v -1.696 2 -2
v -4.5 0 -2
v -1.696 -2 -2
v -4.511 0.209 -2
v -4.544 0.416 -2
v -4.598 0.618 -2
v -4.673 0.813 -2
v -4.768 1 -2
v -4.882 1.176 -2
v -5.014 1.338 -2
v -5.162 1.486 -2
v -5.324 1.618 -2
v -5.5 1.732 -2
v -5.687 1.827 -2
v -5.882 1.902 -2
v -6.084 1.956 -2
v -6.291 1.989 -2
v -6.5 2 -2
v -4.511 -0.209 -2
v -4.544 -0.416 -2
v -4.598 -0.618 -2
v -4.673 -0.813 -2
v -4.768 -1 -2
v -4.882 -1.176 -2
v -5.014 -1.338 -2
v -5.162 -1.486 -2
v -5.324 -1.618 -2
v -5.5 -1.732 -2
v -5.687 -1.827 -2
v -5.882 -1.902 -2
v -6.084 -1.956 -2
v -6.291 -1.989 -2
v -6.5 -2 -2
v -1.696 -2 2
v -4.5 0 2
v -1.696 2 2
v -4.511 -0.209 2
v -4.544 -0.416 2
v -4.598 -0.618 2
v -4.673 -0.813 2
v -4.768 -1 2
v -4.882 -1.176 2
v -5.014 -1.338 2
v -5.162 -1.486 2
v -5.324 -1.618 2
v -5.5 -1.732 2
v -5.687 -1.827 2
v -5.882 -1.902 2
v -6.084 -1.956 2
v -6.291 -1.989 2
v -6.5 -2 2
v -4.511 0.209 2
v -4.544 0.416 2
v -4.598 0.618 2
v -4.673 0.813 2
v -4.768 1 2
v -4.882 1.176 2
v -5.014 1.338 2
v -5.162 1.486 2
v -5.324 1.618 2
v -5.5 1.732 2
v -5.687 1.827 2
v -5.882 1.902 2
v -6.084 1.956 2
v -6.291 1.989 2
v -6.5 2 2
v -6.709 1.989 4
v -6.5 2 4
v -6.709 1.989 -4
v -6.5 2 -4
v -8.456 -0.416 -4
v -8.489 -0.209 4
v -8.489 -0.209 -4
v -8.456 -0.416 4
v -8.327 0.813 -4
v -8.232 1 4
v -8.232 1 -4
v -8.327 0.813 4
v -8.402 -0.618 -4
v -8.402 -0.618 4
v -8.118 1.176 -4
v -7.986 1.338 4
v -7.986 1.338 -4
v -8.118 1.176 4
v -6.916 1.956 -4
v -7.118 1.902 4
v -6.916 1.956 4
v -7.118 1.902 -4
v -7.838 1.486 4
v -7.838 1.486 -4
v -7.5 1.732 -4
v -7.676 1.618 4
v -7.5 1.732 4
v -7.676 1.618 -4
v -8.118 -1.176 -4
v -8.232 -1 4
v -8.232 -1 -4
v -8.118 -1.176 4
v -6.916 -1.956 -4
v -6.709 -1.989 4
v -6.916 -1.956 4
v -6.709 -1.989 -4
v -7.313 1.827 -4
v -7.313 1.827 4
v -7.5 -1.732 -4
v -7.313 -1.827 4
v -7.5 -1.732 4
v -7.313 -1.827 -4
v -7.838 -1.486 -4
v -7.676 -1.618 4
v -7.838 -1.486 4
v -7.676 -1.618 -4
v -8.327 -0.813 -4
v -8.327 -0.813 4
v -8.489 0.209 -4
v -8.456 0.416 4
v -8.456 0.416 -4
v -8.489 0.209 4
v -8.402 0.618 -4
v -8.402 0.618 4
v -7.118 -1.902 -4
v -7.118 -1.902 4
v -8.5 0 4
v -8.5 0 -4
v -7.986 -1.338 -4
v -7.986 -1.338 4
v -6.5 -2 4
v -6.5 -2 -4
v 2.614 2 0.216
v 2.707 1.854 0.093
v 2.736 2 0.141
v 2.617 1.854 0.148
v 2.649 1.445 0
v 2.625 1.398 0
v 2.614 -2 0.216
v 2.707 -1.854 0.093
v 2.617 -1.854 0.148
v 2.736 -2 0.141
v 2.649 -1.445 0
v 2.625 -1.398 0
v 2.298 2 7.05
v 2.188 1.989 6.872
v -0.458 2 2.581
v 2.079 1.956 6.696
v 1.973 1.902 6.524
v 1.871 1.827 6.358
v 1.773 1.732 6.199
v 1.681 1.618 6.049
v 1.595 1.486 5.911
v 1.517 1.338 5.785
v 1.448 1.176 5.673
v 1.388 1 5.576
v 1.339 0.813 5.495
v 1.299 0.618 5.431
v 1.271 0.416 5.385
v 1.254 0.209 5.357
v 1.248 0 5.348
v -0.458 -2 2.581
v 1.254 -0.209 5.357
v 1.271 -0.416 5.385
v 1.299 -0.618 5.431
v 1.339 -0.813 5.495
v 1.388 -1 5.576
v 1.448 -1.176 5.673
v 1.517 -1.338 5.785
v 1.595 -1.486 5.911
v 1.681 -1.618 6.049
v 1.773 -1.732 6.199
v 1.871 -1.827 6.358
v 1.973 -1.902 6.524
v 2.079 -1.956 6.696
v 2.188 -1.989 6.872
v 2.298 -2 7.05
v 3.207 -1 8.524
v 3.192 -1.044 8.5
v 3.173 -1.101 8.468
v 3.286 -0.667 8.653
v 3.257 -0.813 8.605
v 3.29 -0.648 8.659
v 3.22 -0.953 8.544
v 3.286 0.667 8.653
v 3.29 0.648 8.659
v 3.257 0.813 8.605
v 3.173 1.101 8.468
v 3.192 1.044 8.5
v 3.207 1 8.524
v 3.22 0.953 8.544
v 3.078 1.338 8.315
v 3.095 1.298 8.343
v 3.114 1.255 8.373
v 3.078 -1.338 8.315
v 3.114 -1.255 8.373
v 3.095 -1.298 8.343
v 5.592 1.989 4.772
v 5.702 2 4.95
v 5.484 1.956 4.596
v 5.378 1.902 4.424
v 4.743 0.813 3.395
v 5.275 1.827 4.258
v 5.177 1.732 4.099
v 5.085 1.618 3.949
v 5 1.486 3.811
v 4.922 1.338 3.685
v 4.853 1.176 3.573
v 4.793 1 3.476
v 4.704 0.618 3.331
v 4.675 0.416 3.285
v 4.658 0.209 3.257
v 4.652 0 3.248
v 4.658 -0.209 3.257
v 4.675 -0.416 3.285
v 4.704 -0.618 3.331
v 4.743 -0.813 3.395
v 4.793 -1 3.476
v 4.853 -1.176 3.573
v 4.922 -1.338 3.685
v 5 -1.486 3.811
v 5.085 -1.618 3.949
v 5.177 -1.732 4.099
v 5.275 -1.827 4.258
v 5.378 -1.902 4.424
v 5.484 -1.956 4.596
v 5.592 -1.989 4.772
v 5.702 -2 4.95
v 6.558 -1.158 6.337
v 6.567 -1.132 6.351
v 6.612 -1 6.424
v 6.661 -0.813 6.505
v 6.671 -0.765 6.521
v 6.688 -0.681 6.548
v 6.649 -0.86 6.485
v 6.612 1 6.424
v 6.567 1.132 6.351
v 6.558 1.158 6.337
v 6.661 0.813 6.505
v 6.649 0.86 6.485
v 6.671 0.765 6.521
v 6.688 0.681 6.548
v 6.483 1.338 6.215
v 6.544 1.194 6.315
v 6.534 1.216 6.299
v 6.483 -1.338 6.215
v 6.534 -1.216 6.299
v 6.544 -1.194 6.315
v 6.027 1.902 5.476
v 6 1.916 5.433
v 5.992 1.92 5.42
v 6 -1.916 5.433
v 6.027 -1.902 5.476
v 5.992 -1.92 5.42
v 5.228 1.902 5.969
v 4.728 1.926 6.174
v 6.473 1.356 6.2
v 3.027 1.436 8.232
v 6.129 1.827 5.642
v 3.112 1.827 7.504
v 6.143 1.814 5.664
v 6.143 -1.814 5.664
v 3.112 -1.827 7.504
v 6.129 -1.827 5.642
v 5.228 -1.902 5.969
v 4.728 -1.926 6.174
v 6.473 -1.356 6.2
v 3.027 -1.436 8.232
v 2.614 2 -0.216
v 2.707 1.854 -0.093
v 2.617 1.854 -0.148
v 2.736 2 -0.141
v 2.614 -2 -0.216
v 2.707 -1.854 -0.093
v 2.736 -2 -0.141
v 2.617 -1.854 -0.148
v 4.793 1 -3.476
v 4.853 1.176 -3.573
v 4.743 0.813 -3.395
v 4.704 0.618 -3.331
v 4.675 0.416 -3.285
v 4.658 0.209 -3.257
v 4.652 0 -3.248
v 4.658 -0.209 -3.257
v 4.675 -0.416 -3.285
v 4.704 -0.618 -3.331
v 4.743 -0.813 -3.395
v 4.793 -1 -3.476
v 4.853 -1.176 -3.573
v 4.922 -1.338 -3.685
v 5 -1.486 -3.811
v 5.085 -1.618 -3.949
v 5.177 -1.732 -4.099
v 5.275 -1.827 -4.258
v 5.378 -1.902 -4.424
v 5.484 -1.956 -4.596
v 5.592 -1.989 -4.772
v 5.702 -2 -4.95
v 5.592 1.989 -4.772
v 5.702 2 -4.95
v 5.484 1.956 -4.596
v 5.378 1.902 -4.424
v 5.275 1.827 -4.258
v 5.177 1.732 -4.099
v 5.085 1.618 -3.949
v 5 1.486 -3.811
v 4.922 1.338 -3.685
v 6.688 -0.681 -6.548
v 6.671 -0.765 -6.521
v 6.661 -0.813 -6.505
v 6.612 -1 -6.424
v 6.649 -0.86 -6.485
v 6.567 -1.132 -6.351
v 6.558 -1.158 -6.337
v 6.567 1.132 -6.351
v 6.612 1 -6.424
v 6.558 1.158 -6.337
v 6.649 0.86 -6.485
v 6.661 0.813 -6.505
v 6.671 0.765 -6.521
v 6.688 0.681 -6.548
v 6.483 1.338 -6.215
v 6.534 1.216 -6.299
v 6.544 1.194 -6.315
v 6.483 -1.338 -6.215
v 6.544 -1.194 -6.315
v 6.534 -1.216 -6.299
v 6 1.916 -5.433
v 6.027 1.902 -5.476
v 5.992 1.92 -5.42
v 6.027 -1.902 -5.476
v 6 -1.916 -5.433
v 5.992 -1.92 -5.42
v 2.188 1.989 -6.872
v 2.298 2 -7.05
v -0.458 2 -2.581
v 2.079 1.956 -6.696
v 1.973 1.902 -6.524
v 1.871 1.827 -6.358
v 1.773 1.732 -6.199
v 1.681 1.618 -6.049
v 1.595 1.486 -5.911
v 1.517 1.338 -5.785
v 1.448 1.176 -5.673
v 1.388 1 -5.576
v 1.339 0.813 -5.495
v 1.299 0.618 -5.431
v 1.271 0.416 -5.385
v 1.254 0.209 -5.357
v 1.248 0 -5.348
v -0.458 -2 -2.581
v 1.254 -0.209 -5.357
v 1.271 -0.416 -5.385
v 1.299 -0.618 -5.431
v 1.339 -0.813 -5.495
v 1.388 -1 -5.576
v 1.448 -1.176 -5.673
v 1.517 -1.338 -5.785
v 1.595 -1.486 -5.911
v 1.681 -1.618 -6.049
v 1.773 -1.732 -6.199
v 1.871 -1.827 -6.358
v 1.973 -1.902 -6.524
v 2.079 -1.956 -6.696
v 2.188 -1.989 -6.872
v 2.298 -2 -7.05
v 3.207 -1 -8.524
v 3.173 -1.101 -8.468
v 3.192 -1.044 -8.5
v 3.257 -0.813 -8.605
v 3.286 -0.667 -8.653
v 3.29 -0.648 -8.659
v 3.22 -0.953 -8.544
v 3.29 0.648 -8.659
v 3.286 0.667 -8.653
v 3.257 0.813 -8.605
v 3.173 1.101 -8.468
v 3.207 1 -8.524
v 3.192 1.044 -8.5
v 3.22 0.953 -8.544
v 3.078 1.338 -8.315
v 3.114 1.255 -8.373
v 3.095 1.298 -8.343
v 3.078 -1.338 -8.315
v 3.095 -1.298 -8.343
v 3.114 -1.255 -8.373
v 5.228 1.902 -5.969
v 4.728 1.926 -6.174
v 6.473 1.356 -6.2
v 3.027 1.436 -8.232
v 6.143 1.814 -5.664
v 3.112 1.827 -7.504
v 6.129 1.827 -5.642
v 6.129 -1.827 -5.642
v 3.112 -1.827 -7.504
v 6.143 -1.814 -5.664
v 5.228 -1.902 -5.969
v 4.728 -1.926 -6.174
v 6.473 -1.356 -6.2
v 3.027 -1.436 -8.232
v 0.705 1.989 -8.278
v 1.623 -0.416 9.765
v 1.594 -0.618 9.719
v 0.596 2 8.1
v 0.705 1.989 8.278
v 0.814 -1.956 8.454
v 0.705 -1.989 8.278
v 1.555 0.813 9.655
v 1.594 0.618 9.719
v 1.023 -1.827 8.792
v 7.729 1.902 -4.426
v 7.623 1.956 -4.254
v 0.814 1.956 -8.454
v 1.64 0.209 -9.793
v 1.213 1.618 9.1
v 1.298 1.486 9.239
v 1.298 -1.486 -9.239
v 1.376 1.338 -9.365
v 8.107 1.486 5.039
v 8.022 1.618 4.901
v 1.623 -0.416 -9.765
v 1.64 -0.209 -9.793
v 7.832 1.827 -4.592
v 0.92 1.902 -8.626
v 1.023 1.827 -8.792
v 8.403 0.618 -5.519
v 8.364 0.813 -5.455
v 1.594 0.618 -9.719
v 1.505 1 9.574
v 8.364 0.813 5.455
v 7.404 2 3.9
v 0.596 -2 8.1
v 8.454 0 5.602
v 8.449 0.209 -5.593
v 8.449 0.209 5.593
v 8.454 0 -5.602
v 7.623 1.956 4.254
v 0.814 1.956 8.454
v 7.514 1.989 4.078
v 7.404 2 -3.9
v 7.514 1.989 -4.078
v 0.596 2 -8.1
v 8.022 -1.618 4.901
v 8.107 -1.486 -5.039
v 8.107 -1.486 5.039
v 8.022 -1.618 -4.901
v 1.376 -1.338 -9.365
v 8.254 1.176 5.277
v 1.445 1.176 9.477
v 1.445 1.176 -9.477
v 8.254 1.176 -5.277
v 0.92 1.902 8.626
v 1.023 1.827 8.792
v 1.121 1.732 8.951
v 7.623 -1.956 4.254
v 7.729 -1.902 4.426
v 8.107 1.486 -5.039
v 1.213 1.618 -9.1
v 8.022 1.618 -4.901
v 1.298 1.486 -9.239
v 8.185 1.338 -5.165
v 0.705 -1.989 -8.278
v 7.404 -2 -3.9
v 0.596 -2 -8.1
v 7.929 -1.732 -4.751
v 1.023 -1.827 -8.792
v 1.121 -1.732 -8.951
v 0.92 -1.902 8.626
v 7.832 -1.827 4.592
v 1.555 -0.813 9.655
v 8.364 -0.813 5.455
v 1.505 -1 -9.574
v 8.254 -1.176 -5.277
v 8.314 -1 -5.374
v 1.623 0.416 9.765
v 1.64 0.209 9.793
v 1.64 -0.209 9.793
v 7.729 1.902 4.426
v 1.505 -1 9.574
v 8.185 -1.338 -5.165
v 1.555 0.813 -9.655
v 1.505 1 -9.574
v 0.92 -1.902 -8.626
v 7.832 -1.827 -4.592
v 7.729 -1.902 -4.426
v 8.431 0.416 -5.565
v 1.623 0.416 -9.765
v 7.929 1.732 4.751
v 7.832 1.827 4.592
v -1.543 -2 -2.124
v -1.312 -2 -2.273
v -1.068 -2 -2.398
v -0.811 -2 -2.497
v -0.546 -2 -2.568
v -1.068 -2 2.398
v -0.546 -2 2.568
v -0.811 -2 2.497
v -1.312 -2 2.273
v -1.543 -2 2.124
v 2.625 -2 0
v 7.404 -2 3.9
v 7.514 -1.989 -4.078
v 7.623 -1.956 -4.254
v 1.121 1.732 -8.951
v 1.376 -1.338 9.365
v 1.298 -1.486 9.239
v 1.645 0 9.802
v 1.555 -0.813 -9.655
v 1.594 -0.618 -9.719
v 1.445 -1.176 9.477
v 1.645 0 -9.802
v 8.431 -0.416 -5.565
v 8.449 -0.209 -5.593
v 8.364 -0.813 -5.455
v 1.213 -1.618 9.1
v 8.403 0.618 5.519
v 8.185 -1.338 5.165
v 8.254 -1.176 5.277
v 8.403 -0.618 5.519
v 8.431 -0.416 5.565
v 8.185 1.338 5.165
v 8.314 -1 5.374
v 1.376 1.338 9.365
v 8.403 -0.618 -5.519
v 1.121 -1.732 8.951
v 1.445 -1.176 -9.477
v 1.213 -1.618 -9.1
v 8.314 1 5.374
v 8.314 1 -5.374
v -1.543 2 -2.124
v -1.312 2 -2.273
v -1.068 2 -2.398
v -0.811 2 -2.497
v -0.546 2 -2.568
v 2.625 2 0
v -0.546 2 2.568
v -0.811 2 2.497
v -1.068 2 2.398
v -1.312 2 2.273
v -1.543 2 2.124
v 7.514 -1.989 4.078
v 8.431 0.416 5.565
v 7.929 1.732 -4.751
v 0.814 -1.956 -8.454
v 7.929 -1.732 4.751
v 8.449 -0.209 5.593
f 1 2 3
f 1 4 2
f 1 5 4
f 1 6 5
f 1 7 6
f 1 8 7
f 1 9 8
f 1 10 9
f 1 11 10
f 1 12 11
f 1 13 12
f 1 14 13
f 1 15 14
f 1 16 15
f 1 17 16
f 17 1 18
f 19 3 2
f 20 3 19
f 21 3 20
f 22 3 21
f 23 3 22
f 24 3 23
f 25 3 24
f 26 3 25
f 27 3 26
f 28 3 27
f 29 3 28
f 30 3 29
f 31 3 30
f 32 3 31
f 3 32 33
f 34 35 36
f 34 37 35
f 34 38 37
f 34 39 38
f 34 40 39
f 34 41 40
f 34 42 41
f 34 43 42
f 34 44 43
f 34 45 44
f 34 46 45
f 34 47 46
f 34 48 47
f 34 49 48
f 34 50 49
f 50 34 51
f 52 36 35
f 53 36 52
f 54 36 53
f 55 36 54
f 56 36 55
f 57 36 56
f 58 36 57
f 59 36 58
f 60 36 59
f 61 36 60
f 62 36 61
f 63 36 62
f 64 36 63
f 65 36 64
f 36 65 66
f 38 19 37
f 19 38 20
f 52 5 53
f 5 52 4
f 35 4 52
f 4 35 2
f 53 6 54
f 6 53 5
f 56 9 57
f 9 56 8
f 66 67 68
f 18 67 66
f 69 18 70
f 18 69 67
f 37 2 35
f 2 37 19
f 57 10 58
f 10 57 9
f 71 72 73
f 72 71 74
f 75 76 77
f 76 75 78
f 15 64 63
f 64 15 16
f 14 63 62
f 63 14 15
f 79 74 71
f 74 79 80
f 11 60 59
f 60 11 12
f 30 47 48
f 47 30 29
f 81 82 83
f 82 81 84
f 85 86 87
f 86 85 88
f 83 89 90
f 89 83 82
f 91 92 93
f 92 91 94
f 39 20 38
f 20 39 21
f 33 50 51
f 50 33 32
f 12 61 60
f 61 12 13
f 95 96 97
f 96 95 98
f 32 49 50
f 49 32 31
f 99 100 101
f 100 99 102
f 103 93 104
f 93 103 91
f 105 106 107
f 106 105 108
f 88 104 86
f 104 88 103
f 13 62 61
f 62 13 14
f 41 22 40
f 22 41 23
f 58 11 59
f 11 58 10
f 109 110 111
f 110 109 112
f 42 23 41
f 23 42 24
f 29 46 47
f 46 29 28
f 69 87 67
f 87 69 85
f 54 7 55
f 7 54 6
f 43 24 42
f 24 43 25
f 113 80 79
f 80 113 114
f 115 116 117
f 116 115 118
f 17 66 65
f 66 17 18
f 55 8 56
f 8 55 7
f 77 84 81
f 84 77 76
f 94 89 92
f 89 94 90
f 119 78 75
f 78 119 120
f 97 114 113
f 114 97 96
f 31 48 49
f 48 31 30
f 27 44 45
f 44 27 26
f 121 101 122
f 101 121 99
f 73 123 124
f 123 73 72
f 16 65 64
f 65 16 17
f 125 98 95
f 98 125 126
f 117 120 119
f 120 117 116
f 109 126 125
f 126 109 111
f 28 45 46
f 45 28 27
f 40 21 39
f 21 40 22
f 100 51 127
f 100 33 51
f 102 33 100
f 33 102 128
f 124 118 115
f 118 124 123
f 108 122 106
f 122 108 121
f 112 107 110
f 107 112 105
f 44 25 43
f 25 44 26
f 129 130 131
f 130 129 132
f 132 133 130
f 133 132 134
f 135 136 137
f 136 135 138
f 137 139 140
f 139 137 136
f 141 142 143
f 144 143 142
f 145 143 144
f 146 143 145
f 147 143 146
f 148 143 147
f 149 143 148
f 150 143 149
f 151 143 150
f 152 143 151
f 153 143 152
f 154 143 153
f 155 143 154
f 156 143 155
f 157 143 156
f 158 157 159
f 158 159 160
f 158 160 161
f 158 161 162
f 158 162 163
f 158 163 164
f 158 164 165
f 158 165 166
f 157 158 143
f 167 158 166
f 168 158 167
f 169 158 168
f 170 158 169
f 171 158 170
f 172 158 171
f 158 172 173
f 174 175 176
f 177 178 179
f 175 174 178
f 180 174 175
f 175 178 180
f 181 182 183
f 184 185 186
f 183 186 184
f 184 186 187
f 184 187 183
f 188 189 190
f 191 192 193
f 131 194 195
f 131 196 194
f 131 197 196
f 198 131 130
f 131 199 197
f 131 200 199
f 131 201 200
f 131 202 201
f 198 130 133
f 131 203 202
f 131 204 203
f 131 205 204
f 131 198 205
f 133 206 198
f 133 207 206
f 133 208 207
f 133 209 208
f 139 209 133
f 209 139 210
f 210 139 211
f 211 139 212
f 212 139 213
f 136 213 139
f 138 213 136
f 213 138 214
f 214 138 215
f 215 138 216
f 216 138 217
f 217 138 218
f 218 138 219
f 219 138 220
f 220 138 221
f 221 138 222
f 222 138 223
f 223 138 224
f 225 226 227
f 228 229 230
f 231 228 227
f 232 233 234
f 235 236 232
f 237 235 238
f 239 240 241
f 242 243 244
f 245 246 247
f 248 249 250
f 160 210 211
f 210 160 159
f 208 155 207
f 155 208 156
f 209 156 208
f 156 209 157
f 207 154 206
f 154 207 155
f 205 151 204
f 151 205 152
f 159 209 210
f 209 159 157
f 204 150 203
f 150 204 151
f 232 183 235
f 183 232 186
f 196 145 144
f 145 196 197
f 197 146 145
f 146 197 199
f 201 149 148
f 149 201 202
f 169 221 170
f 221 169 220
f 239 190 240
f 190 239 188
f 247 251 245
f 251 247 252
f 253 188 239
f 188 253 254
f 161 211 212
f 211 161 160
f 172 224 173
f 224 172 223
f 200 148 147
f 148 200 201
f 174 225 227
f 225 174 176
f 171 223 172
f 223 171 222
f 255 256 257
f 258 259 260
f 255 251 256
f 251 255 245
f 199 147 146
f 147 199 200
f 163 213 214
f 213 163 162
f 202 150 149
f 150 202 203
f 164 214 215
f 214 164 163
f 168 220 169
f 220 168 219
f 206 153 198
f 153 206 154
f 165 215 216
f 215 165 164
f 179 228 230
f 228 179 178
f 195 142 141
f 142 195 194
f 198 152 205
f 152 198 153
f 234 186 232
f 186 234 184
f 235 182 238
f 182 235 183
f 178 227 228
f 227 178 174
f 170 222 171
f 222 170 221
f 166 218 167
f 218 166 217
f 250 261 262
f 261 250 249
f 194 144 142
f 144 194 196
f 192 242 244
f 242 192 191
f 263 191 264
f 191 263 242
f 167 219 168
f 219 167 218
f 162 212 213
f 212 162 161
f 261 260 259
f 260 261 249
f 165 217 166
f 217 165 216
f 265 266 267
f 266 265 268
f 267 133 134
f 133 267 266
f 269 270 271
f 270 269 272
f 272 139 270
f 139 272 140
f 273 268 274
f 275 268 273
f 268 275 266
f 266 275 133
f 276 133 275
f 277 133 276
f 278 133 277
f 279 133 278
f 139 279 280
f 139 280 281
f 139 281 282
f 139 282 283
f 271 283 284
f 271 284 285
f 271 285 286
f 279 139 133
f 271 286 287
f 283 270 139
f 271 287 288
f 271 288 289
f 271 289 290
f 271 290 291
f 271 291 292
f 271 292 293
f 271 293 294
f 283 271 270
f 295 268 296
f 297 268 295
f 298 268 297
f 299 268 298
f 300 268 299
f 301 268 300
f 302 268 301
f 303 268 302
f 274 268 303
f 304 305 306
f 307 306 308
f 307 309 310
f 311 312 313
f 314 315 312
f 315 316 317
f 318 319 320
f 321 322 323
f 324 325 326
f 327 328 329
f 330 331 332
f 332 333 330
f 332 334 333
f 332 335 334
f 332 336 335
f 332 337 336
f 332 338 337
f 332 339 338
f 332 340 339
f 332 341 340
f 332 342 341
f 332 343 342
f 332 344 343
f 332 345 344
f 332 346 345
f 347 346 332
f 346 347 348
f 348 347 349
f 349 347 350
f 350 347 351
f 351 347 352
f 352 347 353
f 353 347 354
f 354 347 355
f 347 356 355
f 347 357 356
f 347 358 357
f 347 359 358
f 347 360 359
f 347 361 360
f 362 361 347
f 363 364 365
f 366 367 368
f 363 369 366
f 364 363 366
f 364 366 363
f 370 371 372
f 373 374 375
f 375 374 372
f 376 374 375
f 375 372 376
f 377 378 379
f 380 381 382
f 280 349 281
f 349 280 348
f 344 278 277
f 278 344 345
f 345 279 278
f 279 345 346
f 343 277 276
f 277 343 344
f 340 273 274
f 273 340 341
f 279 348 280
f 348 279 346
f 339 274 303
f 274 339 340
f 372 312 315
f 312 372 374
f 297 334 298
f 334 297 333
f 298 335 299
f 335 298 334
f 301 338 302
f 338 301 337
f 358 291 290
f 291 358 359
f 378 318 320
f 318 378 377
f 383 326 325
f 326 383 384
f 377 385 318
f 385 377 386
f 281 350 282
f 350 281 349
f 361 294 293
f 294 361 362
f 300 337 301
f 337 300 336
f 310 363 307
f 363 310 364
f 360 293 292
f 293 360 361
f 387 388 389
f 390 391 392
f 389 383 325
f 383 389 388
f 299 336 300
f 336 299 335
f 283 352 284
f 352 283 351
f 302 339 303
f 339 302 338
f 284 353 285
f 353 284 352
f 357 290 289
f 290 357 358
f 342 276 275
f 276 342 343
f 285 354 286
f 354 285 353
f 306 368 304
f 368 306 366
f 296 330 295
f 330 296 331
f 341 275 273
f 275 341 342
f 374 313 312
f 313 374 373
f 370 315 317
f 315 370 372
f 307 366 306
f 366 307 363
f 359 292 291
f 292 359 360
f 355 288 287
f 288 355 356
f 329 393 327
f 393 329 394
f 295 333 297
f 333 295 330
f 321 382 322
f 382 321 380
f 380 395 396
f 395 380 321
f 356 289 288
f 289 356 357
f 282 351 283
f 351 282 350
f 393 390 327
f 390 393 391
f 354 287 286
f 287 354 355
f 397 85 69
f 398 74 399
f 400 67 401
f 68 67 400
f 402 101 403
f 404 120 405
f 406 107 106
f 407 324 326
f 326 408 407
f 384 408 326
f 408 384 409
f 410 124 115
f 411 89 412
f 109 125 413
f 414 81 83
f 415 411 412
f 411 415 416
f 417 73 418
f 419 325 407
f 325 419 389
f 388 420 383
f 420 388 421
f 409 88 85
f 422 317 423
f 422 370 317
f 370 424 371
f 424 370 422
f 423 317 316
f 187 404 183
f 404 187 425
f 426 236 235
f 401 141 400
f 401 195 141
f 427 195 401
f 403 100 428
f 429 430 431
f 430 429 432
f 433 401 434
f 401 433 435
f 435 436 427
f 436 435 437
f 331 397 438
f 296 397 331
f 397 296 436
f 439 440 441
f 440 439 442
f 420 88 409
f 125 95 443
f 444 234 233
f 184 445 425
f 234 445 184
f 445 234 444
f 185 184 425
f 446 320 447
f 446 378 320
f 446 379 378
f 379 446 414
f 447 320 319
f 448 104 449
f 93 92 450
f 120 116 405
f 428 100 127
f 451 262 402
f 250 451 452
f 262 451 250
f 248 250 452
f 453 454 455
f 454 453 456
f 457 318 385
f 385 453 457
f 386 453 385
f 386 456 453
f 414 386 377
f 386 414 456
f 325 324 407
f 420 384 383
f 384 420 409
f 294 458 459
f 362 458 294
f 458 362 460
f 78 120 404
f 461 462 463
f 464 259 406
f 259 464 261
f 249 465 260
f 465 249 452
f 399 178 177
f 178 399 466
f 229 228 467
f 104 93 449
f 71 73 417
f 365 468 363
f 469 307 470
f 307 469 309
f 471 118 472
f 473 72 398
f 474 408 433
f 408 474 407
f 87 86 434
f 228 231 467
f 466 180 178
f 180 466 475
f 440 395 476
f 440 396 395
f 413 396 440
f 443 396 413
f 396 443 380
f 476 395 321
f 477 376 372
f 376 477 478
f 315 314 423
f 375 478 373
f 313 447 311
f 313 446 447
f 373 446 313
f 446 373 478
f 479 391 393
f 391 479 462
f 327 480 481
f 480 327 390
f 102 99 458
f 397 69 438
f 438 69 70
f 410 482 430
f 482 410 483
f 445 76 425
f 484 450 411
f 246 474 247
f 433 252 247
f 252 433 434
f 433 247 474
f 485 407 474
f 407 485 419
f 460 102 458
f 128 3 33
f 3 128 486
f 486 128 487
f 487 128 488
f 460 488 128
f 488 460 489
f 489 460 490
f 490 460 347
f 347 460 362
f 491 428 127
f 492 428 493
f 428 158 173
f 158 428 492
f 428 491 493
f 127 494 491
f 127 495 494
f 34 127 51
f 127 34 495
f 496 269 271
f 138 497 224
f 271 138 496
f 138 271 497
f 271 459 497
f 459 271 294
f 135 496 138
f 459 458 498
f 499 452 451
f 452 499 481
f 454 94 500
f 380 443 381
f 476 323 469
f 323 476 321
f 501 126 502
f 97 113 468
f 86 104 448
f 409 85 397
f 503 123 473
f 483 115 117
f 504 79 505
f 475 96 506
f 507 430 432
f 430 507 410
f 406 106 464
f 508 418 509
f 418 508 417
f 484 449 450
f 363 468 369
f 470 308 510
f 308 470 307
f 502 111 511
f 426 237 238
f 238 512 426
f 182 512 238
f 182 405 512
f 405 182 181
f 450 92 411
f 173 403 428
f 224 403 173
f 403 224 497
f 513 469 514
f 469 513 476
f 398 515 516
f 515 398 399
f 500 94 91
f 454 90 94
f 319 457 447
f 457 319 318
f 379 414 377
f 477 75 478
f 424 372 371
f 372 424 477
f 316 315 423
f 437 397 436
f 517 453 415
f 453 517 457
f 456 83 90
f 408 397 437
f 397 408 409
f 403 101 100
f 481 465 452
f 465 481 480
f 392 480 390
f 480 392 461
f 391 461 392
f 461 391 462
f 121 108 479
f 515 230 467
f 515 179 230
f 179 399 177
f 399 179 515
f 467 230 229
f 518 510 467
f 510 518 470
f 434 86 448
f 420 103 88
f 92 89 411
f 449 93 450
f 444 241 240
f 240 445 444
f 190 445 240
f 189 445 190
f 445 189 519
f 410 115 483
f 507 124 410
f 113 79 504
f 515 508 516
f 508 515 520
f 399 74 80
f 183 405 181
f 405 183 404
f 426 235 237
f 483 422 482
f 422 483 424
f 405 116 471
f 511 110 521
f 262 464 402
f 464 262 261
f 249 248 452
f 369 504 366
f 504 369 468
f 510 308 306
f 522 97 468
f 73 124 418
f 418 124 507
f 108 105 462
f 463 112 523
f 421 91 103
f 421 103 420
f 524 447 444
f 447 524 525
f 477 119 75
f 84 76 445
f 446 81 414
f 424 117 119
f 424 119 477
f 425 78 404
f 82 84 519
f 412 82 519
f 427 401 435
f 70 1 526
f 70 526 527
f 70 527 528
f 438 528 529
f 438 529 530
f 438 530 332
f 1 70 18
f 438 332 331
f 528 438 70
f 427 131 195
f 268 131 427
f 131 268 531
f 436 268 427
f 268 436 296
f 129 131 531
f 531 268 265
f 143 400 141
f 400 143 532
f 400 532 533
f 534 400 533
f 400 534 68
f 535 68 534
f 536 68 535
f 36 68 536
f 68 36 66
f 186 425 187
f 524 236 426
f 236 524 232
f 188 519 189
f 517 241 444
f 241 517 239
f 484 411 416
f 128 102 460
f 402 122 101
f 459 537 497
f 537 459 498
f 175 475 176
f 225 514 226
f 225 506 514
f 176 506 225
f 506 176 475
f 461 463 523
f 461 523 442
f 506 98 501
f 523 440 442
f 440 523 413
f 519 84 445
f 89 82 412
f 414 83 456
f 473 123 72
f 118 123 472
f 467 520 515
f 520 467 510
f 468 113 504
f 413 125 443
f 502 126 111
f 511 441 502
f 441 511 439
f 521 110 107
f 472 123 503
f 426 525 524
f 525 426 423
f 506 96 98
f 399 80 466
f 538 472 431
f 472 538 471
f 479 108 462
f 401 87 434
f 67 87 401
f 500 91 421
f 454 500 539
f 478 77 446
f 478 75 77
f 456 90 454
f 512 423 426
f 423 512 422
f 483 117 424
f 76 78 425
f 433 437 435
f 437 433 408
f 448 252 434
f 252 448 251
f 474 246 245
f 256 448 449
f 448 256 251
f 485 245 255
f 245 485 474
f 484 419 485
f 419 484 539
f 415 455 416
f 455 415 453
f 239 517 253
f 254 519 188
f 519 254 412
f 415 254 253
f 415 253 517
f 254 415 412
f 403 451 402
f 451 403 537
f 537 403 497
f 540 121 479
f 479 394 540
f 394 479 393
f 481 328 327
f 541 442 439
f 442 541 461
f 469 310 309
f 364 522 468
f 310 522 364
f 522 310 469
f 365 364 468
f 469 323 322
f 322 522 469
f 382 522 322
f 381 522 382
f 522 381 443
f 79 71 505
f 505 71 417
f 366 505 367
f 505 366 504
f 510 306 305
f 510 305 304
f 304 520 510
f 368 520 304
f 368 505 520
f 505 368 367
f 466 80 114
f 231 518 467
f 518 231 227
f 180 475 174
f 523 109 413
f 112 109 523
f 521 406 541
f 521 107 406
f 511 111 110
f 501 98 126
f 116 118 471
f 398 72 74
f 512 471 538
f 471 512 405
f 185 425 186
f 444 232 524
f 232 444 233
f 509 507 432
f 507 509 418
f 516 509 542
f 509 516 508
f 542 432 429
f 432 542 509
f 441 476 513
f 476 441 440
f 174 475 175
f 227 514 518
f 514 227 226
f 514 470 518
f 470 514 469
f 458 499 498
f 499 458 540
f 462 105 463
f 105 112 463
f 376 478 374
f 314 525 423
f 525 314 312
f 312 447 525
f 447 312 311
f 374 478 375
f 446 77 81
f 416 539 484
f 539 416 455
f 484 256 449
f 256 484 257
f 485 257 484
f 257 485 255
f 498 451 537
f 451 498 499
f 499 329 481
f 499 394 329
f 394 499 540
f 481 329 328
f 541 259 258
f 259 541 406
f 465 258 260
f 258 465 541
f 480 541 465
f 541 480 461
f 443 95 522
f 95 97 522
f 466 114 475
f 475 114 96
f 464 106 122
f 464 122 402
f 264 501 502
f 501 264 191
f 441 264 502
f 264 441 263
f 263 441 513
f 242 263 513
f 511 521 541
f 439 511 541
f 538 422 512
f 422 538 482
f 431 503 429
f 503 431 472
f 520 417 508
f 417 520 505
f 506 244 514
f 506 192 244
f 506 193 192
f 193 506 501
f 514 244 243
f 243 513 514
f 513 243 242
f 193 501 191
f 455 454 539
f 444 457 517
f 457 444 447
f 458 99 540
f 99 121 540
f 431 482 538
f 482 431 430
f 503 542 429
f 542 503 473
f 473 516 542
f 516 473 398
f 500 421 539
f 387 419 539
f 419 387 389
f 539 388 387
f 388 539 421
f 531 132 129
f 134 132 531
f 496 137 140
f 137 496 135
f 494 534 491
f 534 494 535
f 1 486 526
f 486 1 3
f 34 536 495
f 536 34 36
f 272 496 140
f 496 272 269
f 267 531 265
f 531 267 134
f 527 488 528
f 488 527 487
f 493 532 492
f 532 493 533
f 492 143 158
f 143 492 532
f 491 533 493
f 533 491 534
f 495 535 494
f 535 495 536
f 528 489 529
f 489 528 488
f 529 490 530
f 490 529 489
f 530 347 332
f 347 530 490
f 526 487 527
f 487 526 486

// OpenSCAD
$fn = 60;

ri_bearing = 2;
ro_bearing = 6;
w_bearing = 4;

r_filament = 1.75/2;

difference() {
  translate([-ro_bearing/2+1, 0, 0]) {
    difference() {
      hull() {
        translate([-ro_bearing+1.5, 0, 0]) {
          cylinder(2*w_bearing, r = ri_bearing, center = true);
        }

        translate([ro_bearing, 0, ro_bearing]) {
          rotate([0, 365/3, 0]) {
          cylinder(2*w_bearing, r = ri_bearing, center = true);
          }
        }

        translate([ro_bearing, 0, -ro_bearing]) {
          rotate([0, -365/3, 0]) {
          cylinder(2*w_bearing, r = ri_bearing, center = true);
          }
        }
      }

      translate([-ro_bearing+1.5, 0, 0]) {
        bearing(ri_bearing, ro_bearing, w_bearing);
      }

      #translate([ro_bearing, 0, ro_bearing]) {
        rotate([0, 365/3, 0]) {
          bearing(ri_bearing, ro_bearing, w_bearing);
        }
      }

      #translate([ro_bearing, 0, -ro_bearing]) {
        rotate([0, -365/3, 0]) {
          bearing(ri_bearing, ro_bearing, w_bearing);
        }
      }
    }
  }
  rotate([90, 0, 0]) {
    cylinder(20, r = 3*r_filament, center = true);
  }
}

module bearing(ri, ro, w) {
  difference() {
    cylinder(w, r = ro, center = true);
    cylinder(2*w, r = ri, center = true);
  }
}
